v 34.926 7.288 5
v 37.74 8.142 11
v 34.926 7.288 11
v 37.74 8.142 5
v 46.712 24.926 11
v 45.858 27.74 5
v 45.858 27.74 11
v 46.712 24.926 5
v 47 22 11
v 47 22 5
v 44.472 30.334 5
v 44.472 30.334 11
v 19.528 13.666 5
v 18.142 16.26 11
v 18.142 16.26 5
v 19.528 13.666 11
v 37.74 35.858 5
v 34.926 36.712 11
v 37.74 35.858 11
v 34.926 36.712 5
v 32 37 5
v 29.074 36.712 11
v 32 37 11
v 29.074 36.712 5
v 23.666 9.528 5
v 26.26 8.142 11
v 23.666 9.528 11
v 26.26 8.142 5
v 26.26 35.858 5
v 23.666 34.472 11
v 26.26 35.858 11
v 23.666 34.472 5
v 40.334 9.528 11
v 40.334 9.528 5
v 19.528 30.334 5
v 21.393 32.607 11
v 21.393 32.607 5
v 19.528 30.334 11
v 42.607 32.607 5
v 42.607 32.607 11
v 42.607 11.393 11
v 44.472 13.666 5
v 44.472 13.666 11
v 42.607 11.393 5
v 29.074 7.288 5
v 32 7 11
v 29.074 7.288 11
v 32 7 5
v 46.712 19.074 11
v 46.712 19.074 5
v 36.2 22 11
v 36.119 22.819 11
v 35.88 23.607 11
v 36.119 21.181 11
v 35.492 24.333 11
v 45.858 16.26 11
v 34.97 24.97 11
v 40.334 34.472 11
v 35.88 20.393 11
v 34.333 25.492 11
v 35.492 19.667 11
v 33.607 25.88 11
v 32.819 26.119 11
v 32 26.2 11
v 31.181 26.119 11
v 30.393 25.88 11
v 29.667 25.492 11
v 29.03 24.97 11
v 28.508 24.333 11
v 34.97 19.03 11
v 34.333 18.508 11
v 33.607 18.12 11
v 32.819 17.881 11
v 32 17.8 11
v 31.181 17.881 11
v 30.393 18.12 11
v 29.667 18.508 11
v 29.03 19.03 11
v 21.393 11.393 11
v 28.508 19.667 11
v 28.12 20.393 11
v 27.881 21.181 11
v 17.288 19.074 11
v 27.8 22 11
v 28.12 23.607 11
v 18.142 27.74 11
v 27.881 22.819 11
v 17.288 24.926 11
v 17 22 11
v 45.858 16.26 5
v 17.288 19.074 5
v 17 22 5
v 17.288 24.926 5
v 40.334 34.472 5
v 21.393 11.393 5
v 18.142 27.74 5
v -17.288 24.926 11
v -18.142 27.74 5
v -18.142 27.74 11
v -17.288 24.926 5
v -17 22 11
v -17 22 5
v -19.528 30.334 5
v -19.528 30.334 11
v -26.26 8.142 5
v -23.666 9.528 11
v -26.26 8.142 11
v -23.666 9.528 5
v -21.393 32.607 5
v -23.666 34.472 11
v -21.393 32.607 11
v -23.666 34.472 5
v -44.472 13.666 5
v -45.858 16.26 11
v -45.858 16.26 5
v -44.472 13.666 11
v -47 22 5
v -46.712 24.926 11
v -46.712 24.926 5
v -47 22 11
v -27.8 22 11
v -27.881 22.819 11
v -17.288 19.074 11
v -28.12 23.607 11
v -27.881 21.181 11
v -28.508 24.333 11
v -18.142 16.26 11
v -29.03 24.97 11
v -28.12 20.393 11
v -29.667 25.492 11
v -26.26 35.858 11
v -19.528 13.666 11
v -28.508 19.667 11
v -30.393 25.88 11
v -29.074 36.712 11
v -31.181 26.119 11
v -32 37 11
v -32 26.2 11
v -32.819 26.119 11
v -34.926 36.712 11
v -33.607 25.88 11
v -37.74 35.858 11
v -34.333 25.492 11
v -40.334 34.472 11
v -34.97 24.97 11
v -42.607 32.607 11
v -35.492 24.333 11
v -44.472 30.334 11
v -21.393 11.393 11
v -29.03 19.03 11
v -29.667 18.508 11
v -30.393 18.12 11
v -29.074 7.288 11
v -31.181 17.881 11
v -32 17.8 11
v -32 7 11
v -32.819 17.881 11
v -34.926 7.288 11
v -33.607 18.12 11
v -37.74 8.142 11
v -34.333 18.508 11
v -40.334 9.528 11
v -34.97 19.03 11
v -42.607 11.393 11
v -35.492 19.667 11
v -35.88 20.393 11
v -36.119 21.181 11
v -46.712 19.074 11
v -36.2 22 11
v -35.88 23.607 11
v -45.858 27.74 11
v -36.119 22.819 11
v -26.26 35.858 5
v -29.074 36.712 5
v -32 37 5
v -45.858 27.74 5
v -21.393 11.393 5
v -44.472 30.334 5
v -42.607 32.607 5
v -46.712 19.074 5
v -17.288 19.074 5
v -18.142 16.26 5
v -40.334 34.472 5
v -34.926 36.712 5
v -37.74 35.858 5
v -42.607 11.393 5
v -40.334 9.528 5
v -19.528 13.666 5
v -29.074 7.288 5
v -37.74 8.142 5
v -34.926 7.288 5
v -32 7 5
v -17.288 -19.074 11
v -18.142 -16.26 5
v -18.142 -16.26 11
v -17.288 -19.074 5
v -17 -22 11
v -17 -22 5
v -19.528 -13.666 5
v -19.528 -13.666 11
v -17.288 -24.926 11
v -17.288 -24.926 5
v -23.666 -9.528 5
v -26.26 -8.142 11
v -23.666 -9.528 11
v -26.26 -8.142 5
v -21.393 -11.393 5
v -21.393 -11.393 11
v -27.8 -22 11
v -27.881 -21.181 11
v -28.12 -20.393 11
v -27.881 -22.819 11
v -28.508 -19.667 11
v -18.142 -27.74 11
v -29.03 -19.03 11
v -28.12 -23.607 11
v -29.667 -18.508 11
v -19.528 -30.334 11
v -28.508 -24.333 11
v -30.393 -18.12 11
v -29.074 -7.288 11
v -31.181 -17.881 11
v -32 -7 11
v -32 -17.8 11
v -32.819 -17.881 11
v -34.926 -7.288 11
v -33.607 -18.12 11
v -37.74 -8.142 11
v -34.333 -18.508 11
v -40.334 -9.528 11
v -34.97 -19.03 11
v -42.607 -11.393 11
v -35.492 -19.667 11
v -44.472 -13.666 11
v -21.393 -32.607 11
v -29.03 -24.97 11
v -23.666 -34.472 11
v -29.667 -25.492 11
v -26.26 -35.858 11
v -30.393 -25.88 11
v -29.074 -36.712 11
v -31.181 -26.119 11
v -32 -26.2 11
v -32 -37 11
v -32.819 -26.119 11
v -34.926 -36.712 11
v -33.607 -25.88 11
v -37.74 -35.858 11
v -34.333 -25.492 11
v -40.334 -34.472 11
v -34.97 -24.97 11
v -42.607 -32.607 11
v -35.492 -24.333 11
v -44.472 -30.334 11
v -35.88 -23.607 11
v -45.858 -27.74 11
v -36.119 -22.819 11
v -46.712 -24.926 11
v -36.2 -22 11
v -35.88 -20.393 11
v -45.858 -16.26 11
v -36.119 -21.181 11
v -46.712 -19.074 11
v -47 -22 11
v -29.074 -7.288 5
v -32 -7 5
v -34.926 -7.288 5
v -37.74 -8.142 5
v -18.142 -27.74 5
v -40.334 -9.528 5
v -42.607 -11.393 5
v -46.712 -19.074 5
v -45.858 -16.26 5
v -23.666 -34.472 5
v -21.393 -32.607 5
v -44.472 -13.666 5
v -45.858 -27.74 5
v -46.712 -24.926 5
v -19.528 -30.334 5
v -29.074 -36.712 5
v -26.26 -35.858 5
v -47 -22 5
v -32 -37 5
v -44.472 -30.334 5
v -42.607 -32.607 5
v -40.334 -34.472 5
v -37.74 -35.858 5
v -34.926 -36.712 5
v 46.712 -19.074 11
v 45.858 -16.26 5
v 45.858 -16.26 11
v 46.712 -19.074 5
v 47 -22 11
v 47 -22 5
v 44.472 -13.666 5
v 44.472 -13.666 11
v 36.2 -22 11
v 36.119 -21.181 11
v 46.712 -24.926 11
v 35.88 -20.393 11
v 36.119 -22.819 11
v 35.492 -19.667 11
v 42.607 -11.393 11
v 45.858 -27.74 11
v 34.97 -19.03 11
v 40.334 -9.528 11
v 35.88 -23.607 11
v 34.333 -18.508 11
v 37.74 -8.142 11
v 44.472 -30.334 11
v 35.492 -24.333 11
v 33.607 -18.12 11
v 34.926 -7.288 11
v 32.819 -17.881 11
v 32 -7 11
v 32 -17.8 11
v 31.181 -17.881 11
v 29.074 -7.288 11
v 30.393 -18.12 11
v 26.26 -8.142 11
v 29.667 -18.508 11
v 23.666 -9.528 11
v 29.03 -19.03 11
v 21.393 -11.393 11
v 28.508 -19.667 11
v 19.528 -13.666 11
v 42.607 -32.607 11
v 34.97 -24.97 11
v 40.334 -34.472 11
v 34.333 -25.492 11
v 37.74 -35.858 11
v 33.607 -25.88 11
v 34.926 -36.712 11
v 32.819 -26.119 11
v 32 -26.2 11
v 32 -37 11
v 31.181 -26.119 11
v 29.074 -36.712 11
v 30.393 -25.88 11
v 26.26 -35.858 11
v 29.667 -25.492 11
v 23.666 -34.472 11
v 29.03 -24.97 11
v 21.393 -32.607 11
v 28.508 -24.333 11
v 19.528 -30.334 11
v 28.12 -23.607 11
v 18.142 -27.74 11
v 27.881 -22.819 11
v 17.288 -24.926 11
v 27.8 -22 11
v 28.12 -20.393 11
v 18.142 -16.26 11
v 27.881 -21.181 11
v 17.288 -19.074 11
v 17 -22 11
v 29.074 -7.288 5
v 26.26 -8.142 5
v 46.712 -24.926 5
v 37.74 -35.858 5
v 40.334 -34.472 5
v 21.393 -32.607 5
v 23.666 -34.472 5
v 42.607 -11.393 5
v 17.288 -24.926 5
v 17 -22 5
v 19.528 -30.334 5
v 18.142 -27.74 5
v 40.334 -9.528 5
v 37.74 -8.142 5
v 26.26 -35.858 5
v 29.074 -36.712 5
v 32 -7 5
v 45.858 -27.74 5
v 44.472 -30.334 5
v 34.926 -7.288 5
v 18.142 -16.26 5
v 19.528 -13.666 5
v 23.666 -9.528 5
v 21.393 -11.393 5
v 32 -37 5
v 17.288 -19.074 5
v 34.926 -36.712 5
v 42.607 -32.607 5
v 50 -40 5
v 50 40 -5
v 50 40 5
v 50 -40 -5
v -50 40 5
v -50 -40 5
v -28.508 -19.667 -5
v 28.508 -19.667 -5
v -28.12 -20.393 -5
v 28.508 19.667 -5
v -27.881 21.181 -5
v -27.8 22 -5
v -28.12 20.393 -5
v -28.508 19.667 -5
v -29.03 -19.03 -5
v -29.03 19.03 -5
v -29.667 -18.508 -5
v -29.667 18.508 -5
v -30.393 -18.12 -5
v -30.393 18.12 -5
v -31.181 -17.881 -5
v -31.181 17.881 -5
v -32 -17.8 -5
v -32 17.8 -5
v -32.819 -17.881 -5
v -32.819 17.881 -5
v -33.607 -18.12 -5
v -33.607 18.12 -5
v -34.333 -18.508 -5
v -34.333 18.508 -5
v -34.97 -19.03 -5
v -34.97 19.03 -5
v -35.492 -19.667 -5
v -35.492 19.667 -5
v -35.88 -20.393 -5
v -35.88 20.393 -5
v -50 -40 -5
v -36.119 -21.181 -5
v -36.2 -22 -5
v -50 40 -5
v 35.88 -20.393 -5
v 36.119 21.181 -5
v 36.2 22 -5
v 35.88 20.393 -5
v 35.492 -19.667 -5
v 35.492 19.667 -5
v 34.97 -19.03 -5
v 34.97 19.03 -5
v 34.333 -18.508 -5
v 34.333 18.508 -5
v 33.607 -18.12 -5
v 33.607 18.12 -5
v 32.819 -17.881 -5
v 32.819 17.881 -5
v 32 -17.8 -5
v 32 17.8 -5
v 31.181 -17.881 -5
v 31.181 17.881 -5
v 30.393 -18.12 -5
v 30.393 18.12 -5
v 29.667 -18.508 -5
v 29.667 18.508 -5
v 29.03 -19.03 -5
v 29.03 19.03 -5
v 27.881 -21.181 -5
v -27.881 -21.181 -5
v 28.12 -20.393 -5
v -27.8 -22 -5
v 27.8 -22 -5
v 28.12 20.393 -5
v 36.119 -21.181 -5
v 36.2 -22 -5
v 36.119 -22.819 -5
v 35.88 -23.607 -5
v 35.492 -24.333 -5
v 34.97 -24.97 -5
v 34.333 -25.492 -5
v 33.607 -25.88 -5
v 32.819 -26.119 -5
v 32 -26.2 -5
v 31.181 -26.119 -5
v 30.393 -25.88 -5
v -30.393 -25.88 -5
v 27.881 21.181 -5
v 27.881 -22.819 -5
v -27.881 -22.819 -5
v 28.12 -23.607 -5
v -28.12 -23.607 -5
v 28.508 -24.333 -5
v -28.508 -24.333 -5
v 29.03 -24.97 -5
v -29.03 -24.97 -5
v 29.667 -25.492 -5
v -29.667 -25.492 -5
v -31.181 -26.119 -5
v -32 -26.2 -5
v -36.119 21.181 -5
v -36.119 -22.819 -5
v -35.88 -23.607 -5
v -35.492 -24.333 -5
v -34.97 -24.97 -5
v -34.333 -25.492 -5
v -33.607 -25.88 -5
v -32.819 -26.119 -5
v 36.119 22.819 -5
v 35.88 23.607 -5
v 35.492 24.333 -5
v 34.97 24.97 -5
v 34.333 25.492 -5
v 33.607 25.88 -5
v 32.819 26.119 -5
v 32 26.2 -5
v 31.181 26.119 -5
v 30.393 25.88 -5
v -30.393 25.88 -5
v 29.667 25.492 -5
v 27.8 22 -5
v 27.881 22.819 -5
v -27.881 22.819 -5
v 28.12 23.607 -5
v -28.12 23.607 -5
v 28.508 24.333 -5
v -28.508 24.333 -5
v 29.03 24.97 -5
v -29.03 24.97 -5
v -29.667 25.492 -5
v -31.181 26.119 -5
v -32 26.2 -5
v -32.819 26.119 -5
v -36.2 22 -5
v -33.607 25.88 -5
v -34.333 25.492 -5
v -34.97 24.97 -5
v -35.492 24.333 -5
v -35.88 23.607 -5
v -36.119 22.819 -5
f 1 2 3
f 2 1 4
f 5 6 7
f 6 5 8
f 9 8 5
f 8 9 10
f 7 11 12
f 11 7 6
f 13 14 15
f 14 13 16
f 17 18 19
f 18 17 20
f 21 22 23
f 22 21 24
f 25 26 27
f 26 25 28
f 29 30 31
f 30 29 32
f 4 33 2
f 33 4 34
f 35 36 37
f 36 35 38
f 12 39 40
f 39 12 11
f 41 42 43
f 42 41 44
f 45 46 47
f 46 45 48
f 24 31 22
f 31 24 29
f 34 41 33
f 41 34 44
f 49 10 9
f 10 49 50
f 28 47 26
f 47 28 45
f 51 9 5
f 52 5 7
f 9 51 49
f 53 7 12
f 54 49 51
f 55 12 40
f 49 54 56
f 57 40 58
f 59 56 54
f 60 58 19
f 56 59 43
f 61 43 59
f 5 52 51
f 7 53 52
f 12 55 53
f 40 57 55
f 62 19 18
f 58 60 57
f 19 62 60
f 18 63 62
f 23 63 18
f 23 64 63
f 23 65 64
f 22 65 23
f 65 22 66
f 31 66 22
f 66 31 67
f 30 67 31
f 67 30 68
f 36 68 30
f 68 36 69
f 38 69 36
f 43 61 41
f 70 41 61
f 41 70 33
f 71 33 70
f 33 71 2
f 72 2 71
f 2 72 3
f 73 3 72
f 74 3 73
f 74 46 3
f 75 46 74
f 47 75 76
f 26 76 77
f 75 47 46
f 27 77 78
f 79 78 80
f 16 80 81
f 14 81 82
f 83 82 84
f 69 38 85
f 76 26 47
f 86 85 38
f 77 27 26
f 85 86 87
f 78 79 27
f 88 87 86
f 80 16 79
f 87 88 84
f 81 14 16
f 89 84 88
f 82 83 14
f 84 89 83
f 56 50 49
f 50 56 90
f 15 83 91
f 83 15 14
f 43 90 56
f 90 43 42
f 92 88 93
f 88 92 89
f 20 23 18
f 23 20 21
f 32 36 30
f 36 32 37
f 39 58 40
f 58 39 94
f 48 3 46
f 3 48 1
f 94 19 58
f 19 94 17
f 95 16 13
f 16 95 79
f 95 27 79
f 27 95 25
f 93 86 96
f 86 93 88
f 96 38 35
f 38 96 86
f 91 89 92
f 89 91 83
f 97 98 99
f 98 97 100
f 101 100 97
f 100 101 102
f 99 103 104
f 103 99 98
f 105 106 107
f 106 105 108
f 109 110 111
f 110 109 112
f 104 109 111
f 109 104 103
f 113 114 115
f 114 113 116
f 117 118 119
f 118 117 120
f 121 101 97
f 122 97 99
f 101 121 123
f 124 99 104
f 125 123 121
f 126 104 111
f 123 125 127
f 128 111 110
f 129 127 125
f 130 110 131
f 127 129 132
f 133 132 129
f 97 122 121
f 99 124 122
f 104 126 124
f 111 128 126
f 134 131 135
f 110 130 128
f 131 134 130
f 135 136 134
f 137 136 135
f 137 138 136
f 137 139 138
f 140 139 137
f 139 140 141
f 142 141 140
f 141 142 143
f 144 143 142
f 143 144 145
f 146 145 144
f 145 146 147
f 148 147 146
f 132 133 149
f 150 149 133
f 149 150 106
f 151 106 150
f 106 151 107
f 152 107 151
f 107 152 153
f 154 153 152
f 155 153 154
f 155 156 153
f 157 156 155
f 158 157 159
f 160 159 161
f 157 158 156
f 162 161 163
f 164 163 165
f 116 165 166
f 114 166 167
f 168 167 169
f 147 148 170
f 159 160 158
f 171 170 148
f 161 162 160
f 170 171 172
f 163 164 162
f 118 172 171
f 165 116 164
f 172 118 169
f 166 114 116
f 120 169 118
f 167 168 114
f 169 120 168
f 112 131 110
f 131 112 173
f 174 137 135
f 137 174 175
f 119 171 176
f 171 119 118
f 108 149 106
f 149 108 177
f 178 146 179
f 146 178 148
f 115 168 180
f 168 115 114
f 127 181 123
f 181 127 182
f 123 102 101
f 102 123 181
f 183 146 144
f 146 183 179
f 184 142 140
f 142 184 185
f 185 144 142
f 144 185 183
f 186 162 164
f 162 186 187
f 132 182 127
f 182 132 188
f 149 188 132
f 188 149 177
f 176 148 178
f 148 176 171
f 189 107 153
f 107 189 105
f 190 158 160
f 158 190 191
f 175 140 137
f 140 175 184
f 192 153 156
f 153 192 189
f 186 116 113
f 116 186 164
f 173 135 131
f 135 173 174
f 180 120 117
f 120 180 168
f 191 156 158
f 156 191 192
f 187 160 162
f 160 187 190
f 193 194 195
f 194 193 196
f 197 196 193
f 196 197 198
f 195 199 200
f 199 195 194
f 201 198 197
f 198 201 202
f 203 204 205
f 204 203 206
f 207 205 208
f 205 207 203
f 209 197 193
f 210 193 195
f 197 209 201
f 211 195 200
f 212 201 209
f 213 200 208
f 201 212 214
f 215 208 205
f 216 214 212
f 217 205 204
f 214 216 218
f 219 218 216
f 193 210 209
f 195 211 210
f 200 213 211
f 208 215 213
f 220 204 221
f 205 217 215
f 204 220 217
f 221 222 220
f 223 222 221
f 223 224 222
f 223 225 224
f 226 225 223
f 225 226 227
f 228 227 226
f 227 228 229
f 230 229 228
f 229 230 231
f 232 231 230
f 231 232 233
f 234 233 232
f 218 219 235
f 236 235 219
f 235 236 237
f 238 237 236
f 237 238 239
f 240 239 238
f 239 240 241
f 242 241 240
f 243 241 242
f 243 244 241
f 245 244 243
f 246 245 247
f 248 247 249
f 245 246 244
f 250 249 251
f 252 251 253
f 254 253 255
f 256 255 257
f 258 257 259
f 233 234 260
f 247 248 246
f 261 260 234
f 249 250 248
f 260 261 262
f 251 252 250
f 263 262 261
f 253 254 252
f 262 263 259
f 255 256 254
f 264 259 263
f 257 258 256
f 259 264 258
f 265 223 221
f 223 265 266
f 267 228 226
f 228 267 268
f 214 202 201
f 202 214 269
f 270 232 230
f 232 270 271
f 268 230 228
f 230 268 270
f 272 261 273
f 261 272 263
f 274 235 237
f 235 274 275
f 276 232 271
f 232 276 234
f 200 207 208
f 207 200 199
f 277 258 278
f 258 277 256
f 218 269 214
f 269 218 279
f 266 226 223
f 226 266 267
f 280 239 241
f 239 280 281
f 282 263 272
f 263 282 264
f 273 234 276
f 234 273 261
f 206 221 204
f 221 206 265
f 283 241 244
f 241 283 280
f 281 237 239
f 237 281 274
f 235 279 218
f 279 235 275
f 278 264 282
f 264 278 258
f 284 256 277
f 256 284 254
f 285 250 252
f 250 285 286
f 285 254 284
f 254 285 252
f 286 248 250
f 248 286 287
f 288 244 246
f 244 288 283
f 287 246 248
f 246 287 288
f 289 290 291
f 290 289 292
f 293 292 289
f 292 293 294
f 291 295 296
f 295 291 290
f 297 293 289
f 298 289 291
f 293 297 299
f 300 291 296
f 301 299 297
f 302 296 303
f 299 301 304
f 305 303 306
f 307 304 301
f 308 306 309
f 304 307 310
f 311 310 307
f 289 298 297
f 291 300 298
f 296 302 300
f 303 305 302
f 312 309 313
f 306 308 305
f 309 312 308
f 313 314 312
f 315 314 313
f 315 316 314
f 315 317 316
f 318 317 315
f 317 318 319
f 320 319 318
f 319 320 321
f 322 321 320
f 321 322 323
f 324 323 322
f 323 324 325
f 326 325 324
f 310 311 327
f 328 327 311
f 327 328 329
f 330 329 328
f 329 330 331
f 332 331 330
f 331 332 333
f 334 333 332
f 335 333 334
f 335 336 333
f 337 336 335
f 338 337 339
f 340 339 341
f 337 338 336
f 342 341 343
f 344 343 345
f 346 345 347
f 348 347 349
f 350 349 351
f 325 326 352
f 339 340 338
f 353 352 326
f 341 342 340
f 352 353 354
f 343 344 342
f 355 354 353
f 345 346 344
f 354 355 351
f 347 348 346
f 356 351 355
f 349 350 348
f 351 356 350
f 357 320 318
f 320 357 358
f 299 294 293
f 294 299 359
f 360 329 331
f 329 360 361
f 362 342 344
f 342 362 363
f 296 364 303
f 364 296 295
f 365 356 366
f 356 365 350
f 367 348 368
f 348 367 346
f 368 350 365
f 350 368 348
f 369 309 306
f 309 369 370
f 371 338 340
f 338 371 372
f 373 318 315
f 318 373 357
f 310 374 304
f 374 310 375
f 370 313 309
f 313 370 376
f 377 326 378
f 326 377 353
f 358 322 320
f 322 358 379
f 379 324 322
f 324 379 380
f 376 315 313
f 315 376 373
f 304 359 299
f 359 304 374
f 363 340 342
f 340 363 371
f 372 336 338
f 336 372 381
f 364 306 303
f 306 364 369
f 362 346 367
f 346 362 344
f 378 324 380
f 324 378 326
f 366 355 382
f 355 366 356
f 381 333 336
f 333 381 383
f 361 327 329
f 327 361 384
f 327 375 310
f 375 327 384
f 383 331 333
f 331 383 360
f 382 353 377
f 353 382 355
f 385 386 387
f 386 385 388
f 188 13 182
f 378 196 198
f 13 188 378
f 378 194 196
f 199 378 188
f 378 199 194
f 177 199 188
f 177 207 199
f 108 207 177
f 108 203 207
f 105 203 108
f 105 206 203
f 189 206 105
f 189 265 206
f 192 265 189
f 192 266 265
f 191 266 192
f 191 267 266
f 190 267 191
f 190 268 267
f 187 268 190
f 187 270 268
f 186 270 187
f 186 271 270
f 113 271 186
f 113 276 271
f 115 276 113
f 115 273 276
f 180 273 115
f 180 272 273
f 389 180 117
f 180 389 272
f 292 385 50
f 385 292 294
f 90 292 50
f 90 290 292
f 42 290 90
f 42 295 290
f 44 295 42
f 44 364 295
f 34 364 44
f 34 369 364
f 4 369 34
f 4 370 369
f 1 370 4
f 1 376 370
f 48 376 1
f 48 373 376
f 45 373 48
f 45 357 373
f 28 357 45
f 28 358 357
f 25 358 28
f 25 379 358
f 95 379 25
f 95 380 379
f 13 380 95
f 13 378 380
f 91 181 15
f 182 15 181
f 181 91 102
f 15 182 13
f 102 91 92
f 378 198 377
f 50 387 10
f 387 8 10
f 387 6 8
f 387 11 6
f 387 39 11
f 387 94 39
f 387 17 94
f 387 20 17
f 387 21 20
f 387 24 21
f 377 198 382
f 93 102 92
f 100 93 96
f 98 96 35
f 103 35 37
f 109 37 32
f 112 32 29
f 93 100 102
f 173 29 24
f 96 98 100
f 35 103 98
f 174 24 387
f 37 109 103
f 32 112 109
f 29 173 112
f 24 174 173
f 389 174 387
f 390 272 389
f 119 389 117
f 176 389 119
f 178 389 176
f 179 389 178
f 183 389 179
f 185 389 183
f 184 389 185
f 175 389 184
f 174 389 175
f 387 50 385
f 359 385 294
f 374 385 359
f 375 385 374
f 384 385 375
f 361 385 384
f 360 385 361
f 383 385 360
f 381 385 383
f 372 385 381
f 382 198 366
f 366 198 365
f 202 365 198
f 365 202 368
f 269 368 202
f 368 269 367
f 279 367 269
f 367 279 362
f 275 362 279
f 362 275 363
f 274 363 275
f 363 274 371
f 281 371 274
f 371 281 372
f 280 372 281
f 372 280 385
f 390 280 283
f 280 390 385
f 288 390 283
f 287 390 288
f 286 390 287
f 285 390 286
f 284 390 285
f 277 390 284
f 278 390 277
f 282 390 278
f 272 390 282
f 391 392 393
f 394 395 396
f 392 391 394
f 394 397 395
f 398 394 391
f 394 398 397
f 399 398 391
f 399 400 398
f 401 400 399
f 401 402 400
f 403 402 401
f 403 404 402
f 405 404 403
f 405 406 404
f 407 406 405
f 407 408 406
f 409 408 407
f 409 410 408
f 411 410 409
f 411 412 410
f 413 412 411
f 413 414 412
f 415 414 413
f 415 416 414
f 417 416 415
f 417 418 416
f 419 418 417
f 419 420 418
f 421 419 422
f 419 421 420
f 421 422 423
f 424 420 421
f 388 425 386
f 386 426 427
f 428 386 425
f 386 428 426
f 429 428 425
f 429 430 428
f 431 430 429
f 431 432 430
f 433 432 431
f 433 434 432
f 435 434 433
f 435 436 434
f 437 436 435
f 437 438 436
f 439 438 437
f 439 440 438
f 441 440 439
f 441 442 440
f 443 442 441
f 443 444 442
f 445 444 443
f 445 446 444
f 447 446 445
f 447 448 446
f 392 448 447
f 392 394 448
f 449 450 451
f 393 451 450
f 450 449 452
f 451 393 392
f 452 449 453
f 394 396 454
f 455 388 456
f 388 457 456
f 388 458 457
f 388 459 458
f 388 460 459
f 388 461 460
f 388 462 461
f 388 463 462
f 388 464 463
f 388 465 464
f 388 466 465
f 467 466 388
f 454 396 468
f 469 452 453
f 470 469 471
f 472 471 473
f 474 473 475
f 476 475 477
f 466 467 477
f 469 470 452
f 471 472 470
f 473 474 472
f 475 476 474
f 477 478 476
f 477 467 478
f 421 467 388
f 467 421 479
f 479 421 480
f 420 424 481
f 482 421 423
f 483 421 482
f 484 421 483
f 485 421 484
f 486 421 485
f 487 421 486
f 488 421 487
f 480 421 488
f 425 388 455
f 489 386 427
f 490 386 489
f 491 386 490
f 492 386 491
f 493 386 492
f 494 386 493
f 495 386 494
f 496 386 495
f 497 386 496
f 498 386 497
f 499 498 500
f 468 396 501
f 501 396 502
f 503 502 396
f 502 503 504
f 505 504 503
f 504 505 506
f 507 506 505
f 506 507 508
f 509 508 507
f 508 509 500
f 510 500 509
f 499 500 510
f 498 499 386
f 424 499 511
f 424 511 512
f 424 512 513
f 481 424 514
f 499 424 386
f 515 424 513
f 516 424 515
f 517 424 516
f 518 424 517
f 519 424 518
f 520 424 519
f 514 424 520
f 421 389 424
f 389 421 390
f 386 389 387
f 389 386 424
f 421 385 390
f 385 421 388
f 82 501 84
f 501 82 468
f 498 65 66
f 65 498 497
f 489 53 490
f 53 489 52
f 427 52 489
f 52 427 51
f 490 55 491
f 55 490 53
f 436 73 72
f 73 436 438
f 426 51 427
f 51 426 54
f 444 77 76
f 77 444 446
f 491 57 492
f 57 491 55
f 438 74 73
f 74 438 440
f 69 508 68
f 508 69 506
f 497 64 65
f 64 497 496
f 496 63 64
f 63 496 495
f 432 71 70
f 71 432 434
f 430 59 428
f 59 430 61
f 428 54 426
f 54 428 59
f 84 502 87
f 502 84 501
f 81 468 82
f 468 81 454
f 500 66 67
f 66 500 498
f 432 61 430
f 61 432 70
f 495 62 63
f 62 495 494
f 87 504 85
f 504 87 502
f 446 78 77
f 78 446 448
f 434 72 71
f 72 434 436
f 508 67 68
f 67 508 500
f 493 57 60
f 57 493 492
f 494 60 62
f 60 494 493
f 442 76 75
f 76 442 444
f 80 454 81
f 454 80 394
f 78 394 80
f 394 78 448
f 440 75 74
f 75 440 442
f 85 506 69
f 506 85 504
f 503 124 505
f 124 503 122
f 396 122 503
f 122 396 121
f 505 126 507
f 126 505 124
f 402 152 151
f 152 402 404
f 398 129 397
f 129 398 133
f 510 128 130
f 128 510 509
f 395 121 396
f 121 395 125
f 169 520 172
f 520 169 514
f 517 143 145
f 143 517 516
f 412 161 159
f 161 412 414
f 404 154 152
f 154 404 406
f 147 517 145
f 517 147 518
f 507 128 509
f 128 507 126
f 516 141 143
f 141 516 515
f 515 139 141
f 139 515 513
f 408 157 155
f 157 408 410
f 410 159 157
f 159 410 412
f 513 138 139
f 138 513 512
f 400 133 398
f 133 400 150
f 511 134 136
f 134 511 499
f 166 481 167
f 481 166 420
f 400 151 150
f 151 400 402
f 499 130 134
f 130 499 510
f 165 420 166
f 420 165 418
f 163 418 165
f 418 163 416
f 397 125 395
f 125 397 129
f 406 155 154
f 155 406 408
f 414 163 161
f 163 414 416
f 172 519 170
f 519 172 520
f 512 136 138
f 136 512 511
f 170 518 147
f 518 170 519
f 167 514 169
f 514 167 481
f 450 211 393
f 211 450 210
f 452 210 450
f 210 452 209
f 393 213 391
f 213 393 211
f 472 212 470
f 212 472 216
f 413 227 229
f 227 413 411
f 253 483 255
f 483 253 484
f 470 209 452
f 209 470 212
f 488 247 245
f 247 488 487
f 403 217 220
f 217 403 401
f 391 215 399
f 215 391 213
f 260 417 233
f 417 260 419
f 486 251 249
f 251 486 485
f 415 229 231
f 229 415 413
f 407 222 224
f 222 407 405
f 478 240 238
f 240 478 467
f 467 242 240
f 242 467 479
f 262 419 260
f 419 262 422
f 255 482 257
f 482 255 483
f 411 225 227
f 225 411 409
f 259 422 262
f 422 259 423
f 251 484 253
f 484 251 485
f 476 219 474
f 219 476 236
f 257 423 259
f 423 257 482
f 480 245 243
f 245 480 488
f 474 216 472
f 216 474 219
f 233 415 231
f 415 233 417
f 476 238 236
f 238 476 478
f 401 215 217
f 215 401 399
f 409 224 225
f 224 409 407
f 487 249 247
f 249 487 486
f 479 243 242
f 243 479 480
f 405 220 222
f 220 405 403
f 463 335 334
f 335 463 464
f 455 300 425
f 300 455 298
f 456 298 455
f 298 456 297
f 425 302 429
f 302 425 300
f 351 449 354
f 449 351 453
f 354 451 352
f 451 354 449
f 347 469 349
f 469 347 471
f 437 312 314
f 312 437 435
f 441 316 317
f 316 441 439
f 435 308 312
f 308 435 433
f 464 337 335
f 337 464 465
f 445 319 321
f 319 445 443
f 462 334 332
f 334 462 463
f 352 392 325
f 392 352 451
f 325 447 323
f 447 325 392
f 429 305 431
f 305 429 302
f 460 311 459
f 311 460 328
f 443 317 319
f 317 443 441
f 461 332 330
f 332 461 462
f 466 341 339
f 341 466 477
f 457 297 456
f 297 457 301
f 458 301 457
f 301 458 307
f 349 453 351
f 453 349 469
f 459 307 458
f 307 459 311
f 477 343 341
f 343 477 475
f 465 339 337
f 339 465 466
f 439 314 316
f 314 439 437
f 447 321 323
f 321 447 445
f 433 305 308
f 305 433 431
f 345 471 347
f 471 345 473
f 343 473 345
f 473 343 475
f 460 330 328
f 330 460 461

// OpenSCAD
$fn = 32;

// ----------------------------------------------------------------------
// Anchor pads 100 x 80 x 16
// four corner bosses with anchor holes
// ----------------------------------------------------------------------

// --- parameters (mm) ---
plate = [100, 80, 10];  // base plate size (x, y, z)
seat_tol = 0.1;         // tolerance at the seating features
free_tol = 0.3;         // general tolerance on the free sizes
pads = 4;               // boss count, one per corner
edge = 18;              // boss centre offset from the plate edge
boss_d = 30;            // boss diameter
boss_h = 6;             // boss height above the base plate
hole_d = 8.4;           // hole diameter

// --- derived feature positions (mm) ---
height = plate[2] + boss_h;      // = 16   overall height of the part
corner_x = plate[0] / 2 - edge;  // = 32   boss centre X
corner_y = plate[1] / 2 - edge;  // = 22   boss centre Y
feature_centers = [
  [corner_x, corner_y],
  [-corner_x, corner_y],
  [-corner_x, -corner_y],
  [corner_x, -corner_y]
];   // boss centres, anchor holes are drilled there

// base plate, four bosses standing on it, anchor holes all the way through
difference() {
  union() {
    cube(plate, center = true);
    for (centre = feature_centers)
      translate([centre[0], centre[1], plate[2] / 2 - 1])
        cylinder(d = boss_d, h = boss_h + 1);
  }
  for (centre = feature_centers)
    translate([centre[0], centre[1], -height])
      cylinder(d = hole_d, h = 2 * height + 2);  // through boss and plate
}
